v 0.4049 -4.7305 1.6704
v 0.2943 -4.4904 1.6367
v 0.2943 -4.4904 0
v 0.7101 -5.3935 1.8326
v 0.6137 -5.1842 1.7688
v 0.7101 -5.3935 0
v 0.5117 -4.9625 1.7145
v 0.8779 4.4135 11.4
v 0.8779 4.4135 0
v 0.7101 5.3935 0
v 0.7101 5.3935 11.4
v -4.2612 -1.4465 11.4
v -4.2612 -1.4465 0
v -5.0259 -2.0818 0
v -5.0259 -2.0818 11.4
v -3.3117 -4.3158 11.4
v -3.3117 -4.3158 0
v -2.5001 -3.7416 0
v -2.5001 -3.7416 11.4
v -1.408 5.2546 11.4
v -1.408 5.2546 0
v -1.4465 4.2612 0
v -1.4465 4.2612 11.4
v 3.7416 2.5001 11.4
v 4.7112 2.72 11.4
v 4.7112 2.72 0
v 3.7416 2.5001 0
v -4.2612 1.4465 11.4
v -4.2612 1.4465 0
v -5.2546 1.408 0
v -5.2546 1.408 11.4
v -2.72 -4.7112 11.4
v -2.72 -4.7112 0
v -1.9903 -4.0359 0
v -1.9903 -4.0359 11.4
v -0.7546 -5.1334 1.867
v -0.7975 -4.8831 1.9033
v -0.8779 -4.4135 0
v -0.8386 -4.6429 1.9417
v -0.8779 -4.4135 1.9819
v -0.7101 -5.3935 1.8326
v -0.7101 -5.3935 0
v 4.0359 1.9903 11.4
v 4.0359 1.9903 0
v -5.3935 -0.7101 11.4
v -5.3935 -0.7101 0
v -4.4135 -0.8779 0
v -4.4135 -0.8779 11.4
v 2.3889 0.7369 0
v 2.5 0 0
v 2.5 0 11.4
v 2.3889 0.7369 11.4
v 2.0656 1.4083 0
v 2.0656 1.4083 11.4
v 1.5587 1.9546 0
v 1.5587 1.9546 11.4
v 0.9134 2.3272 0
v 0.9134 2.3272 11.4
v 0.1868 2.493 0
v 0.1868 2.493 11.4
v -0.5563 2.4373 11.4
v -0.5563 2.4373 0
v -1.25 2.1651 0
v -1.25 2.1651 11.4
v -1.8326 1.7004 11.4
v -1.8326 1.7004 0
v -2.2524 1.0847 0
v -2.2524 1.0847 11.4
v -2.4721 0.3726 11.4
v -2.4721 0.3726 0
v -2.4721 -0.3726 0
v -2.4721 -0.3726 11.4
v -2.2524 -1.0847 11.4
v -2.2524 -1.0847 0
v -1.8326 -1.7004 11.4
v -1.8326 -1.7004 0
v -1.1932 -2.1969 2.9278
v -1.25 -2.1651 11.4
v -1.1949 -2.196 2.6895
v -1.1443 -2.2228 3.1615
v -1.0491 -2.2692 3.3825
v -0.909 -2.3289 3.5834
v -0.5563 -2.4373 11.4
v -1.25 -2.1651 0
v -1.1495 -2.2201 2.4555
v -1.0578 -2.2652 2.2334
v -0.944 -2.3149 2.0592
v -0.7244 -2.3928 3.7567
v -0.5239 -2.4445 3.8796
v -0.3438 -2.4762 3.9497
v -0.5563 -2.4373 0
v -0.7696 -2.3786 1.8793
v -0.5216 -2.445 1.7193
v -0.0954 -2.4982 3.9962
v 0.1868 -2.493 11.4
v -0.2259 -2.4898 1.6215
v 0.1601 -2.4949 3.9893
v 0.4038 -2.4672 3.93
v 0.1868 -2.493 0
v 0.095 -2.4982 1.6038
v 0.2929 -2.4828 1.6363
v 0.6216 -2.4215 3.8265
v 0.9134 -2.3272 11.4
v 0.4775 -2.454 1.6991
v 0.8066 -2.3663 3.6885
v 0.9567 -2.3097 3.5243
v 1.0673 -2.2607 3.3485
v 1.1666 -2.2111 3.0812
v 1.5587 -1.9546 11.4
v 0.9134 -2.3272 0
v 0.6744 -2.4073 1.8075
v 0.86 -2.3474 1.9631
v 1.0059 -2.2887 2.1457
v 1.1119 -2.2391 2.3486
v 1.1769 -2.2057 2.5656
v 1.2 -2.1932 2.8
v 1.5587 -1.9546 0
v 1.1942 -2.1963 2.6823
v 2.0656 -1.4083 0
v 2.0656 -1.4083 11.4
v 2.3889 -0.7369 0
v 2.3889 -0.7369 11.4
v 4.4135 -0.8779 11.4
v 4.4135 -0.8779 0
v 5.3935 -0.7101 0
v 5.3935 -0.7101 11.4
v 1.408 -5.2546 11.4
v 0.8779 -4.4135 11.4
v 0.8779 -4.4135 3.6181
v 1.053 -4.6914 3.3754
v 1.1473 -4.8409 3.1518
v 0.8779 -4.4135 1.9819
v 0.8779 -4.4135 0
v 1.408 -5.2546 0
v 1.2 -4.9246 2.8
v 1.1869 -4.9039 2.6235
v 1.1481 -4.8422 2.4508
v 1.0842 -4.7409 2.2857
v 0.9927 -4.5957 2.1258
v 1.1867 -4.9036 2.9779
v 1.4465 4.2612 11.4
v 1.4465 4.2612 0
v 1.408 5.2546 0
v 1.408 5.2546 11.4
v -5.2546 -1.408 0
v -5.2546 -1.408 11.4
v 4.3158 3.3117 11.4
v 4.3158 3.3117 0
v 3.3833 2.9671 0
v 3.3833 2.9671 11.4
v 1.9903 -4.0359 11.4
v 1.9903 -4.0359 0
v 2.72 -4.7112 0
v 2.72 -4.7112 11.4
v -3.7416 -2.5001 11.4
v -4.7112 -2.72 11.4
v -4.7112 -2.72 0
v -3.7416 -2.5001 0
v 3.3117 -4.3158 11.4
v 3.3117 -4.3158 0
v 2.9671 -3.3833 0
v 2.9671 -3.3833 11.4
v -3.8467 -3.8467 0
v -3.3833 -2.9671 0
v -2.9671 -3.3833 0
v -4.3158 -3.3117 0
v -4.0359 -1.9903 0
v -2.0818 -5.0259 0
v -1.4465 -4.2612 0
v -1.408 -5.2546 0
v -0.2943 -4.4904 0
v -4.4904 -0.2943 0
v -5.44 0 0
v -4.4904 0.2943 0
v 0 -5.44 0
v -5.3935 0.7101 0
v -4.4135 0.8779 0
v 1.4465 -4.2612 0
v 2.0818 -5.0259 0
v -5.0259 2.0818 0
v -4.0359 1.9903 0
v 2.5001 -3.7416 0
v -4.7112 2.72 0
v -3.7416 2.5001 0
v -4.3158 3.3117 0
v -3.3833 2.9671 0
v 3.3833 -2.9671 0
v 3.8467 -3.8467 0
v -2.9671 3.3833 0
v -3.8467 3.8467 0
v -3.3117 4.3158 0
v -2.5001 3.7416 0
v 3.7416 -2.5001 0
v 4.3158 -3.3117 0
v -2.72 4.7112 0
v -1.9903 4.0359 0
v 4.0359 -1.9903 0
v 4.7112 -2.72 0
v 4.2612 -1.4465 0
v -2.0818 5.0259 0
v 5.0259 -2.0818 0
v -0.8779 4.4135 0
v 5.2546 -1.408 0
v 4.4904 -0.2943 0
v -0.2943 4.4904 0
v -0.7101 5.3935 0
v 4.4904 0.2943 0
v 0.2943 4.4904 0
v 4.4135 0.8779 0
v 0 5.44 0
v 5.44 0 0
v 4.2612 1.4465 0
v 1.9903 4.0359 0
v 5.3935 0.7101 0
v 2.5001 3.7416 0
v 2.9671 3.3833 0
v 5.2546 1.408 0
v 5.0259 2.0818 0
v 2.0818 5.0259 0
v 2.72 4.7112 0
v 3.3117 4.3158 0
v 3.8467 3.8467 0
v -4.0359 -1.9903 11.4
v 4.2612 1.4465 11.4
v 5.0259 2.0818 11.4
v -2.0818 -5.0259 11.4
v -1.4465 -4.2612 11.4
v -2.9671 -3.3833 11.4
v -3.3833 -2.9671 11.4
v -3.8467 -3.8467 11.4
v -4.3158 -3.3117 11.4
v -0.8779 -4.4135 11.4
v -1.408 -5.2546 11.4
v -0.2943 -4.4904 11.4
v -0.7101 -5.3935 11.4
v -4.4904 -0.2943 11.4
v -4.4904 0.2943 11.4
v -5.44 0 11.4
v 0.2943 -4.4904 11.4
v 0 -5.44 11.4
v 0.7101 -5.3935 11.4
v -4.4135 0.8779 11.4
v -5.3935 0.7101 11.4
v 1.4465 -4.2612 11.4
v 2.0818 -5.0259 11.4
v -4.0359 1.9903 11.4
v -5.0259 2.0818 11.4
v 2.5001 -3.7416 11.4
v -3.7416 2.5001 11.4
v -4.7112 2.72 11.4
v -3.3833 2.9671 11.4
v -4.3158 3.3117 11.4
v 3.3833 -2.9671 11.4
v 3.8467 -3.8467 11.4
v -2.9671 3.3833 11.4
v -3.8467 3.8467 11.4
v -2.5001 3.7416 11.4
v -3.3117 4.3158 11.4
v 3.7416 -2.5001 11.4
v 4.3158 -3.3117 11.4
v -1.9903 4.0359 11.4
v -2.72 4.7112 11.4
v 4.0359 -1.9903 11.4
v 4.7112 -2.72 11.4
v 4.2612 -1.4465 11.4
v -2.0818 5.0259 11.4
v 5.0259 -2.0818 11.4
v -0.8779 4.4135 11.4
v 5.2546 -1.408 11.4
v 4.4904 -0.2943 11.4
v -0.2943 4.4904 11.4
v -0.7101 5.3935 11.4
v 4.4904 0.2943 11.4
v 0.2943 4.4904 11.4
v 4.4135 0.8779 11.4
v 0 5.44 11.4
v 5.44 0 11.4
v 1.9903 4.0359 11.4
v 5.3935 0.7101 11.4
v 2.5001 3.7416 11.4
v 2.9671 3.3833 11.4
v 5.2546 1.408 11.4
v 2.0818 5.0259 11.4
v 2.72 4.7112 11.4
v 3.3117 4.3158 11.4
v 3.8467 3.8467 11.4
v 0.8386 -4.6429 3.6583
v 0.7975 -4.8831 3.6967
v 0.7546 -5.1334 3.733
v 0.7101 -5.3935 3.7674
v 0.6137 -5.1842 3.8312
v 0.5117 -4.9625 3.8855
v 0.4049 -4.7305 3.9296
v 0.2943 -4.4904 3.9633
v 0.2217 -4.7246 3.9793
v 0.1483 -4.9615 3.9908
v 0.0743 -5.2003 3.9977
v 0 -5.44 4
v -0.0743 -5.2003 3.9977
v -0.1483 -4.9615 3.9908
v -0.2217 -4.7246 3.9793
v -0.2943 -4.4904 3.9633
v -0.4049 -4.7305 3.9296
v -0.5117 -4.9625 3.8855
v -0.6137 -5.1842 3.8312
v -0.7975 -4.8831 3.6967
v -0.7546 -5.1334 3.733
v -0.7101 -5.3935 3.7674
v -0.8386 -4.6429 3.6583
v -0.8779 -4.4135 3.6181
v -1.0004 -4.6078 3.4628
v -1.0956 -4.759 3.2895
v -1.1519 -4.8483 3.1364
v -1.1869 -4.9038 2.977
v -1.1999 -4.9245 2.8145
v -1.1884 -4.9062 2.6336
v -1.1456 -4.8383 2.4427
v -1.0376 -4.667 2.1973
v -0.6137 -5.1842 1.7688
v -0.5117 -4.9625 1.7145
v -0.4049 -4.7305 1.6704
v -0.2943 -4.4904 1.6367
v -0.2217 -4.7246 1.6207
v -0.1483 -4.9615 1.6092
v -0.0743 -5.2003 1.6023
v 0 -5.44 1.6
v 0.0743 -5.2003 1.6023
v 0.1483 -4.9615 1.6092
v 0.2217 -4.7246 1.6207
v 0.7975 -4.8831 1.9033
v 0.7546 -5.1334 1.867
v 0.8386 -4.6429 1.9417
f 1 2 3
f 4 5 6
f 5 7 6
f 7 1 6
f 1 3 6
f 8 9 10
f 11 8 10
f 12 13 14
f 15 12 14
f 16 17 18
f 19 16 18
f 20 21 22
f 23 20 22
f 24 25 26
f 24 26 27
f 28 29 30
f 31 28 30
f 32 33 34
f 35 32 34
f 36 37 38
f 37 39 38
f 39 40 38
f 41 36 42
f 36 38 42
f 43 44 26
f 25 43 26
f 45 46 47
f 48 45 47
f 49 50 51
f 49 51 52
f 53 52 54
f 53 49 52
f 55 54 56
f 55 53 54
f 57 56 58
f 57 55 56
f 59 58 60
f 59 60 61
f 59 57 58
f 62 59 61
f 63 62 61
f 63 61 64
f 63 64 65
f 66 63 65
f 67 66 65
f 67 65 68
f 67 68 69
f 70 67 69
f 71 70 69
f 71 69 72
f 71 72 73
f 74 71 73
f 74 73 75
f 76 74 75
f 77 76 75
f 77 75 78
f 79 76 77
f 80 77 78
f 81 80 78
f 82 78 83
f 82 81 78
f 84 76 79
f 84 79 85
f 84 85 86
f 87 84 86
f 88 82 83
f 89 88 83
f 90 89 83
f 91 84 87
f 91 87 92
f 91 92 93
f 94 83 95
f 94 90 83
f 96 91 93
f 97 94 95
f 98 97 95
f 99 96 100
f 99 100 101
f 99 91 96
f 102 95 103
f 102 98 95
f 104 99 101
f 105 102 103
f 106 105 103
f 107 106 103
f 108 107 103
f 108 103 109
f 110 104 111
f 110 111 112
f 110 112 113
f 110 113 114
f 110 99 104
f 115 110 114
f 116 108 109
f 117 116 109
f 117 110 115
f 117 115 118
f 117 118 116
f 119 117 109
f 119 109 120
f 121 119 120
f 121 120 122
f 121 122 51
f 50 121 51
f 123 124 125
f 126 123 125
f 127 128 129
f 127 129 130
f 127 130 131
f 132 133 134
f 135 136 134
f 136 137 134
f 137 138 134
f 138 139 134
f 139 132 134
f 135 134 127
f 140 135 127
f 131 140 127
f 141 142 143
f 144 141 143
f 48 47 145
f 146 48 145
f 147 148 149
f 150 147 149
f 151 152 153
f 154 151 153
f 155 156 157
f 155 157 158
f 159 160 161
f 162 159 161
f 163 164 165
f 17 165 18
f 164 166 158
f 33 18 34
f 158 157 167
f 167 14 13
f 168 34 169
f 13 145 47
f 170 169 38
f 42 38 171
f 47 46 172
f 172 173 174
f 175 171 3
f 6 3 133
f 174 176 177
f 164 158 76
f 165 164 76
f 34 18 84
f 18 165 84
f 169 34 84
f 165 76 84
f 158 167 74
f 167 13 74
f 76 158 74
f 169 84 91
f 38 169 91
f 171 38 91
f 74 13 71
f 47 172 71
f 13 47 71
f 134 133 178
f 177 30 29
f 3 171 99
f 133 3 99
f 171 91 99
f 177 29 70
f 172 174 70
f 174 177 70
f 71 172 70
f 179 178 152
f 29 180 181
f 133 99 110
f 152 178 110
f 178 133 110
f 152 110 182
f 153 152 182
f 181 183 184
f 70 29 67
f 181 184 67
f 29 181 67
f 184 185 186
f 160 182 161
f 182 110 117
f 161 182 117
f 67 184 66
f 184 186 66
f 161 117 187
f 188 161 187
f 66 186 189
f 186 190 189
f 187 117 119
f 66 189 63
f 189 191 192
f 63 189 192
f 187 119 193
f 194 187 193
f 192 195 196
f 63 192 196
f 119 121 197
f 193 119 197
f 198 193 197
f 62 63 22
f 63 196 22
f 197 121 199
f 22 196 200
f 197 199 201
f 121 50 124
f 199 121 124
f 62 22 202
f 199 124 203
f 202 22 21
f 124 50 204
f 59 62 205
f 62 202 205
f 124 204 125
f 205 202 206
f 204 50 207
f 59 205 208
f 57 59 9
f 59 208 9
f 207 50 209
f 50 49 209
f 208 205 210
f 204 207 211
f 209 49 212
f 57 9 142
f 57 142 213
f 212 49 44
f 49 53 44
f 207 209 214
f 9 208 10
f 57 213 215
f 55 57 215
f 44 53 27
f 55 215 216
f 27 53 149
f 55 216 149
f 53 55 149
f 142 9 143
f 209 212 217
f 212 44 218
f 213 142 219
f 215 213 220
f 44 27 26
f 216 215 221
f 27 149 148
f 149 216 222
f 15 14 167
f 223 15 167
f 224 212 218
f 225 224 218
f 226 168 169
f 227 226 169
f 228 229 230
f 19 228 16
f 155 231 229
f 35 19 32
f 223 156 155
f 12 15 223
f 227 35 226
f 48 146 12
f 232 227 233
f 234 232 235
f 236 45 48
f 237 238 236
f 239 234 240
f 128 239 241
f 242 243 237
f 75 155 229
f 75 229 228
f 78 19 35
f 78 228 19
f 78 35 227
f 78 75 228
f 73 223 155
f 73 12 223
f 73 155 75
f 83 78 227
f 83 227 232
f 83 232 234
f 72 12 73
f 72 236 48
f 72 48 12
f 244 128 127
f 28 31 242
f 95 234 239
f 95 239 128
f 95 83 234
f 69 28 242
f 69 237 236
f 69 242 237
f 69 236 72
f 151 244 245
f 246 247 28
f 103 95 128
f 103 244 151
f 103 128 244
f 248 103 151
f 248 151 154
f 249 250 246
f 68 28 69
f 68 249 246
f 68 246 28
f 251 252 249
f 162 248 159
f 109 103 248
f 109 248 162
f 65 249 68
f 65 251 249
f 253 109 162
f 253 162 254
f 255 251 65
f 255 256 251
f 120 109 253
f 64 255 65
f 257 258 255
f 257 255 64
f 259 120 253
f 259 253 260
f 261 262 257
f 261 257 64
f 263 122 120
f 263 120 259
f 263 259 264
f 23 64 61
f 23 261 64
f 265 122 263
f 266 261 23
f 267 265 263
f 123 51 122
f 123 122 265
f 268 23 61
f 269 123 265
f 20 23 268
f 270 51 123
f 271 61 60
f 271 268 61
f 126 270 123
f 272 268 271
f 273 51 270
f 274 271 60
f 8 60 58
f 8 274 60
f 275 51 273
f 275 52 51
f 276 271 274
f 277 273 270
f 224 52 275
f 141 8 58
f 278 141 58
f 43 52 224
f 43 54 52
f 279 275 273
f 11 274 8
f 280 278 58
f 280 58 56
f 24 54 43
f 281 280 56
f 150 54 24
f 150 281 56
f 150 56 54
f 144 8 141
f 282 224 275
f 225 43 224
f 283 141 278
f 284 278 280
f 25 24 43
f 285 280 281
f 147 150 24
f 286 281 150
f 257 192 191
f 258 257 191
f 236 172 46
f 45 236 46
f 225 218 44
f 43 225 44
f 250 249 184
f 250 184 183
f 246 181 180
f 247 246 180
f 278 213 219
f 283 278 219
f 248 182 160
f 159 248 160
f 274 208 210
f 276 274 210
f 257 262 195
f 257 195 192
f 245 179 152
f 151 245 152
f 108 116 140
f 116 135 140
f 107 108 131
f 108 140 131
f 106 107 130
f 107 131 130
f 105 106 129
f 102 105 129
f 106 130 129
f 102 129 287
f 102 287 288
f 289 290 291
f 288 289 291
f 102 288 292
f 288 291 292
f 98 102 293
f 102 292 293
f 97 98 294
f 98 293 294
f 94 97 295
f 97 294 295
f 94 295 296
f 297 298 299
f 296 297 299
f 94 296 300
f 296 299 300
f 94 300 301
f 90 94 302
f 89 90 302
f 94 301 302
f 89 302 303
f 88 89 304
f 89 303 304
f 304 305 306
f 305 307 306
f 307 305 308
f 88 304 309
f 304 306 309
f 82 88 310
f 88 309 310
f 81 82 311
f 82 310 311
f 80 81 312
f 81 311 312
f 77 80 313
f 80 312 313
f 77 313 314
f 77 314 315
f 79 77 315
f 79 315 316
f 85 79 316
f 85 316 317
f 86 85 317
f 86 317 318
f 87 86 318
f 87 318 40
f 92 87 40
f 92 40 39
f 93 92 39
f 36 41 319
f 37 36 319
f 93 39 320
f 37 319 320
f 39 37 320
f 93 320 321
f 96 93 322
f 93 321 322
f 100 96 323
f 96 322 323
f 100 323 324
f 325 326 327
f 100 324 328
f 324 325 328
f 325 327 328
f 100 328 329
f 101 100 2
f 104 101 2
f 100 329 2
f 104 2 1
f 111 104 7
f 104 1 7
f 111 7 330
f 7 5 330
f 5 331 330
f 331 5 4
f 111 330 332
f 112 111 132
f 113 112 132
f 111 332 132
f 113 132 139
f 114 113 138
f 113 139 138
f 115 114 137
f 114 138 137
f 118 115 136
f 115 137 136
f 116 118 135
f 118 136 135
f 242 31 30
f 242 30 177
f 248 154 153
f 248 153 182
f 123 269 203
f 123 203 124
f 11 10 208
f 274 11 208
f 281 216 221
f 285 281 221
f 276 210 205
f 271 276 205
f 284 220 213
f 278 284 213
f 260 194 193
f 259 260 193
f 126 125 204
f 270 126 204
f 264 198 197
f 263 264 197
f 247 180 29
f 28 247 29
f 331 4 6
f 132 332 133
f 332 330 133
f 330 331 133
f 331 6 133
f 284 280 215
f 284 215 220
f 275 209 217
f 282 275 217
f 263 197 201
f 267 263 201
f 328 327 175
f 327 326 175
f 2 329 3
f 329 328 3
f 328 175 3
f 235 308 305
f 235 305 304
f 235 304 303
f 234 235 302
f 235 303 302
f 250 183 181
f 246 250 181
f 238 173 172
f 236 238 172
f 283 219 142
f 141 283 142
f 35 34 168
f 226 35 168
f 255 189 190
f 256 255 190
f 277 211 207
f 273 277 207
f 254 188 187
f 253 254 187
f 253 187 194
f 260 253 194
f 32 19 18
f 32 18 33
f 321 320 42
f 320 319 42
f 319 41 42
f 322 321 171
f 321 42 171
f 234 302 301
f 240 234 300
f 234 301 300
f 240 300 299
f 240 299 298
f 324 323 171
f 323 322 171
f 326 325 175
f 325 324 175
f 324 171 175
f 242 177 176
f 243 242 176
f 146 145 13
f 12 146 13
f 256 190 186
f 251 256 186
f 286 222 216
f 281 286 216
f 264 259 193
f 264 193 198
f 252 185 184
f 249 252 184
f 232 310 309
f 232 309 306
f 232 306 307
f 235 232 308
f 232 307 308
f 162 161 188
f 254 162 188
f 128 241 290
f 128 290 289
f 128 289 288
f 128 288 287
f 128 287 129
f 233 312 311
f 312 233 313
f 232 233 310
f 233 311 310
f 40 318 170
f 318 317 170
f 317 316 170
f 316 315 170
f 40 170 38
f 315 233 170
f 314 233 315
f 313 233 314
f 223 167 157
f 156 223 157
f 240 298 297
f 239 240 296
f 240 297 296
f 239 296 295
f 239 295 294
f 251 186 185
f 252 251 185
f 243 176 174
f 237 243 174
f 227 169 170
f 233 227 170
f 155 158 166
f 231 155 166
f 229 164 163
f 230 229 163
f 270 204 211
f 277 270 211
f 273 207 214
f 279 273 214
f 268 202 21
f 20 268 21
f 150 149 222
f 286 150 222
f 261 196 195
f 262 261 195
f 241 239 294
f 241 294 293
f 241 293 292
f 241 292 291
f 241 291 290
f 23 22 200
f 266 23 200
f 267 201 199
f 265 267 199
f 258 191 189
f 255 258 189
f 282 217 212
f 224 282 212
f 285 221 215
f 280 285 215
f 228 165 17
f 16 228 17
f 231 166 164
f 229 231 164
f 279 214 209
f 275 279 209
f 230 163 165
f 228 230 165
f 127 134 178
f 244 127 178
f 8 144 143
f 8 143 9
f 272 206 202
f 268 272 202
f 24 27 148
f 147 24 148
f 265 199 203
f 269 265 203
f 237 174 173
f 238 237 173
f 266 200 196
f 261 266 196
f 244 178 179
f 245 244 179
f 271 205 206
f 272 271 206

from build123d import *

# Parameters (mm, degrees)
EXTRUDE_1_DEPTH   = 11.4
OTHER_1_OUTLINE_R = 2.5
OTHER_1_DEPTH     = 11.4
SKETCH_9_R        = 1.2


# Read off the part's stored shape, not the designer's step: 孔1
with BuildPart() as part:
    # 草图6 → 凸台-拉伸1 (new body)
    with BuildSketch(Plane.XY):
        Polygon((5.393460046, -0.710062486), (4.490365155, -0.294314082), (5.44, 0), (4.490365155, 0.294314082), (5.393460046, 0.710062486), (4.413533762, 0.877906449), (5.254636495, 1.407975605), (4.261185583, 1.446477594), (5.025904657, 2.081797872), (4.035927337, 1.990299106), (4.711178197, 2.72), (3.741613255, 2.500066049), (4.315842171, 3.311662174), (3.383279134, 2.967056168), (3.84666089, 3.84666089), (2.967056168, 3.383279134), (3.311662174, 4.315842171), (2.500066049, 3.741613255), (2.72, 4.711178197), (1.990299106, 4.035927337), (2.081797872, 5.025904657), (1.446477594, 4.261185583), (1.407975605, 5.254636495), (0.877906449, 4.413533762), (0.710062486, 5.393460046), (0.294314082, 4.490365155), (0, 5.44), (-0.294314082, 4.490365155), (-0.710062486, 5.393460046), (-0.877906449, 4.413533762), (-1.407975605, 5.254636495), (-1.446477594, 4.261185583), (-2.081797872, 5.025904657), (-1.990299106, 4.035927337), (-2.72, 4.711178197), (-2.500066049, 3.741613255), (-3.311662174, 4.315842171), (-2.967056168, 3.383279134), (-3.84666089, 3.84666089), (-3.383279134, 2.967056168), (-4.315842171, 3.311662174), (-3.741613255, 2.500066049), (-4.711178197, 2.72), (-4.035927337, 1.990299106), (-5.025904657, 2.081797872), (-4.261185583, 1.446477594), (-5.254636495, 1.407975605), (-4.413533762, 0.877906449), (-5.393460046, 0.710062486), (-4.490365155, 0.294314082), (-5.44, 0), (-4.490365155, -0.294314082), (-5.393460046, -0.710062486), (-4.413533762, -0.877906449), (-5.254636495, -1.407975605), (-4.261185583, -1.446477594), (-5.025904657, -2.081797872), (-4.035927337, -1.990299106), (-4.711178197, -2.72), (-3.741613255, -2.500066049), (-4.315842171, -3.311662174), (-3.383279134, -2.967056168), (-3.84666089, -3.84666089), (-2.967056168, -3.383279134), (-3.311662174, -4.315842171), (-2.500066049, -3.741613255), (-2.72, -4.711178197), (-1.990299106, -4.035927337), (-2.081797872, -5.025904657), (-1.446477594, -4.261185583), (-1.407975605, -5.254636495), (-0.877906449, -4.413533762), (-0.710062486, -5.393460046), (-0.294314082, -4.490365155), (0, -5.44), (0.294314082, -4.490365155), (0.710062486, -5.393460046), (0.877906449, -4.413533762), (1.407975605, -5.254636495), (1.446477594, -4.261185583), (2.081797872, -5.025904657), (1.990299106, -4.035927337), (2.72, -4.711178197), (2.500066049, -3.741613255), (3.311662174, -4.315842171), (2.967056168, -3.383279134), (3.84666089, -3.84666089), (3.383279134, -2.967056168), (4.315842171, -3.311662174), (3.741613255, -2.500066049), (4.711178197, -2.72), (4.035927337, -1.990299106), (5.025904657, -2.081797872), (4.261185583, -1.446477594), (5.254636495, -1.407975605), (4.413533762, -0.877906449), align=None)
    extrude(amount=EXTRUDE_1_DEPTH)

    # 孔1 outline → 孔1 (cut)
    with BuildSketch(Plane.XY):
        Circle(OTHER_1_OUTLINE_R)
    extrude(amount=OTHER_1_DEPTH, mode=Mode.SUBTRACT)

    # 切除-扫描1: sweep along a path in 草图10
    with BuildLine(Plane(origin=(0, 0, 0), x_dir=(0, 0, -1), z_dir=(1, 0, 0))) as sweep_1_path:
        Line((-2.8, 0), (-2.8, -5.857853696))
    # 草图9 → 切除-扫描1 (sweep, cut)
    with BuildSketch(Plane(origin=(0, 0, 0), x_dir=(1, 0, 0), z_dir=(0, 1, 0))):
        with Locations((0, -2.8)):
            Circle(SKETCH_9_R)
    sweep(path=sweep_1_path.line, mode=Mode.SUBTRACT)


solid = part.part
